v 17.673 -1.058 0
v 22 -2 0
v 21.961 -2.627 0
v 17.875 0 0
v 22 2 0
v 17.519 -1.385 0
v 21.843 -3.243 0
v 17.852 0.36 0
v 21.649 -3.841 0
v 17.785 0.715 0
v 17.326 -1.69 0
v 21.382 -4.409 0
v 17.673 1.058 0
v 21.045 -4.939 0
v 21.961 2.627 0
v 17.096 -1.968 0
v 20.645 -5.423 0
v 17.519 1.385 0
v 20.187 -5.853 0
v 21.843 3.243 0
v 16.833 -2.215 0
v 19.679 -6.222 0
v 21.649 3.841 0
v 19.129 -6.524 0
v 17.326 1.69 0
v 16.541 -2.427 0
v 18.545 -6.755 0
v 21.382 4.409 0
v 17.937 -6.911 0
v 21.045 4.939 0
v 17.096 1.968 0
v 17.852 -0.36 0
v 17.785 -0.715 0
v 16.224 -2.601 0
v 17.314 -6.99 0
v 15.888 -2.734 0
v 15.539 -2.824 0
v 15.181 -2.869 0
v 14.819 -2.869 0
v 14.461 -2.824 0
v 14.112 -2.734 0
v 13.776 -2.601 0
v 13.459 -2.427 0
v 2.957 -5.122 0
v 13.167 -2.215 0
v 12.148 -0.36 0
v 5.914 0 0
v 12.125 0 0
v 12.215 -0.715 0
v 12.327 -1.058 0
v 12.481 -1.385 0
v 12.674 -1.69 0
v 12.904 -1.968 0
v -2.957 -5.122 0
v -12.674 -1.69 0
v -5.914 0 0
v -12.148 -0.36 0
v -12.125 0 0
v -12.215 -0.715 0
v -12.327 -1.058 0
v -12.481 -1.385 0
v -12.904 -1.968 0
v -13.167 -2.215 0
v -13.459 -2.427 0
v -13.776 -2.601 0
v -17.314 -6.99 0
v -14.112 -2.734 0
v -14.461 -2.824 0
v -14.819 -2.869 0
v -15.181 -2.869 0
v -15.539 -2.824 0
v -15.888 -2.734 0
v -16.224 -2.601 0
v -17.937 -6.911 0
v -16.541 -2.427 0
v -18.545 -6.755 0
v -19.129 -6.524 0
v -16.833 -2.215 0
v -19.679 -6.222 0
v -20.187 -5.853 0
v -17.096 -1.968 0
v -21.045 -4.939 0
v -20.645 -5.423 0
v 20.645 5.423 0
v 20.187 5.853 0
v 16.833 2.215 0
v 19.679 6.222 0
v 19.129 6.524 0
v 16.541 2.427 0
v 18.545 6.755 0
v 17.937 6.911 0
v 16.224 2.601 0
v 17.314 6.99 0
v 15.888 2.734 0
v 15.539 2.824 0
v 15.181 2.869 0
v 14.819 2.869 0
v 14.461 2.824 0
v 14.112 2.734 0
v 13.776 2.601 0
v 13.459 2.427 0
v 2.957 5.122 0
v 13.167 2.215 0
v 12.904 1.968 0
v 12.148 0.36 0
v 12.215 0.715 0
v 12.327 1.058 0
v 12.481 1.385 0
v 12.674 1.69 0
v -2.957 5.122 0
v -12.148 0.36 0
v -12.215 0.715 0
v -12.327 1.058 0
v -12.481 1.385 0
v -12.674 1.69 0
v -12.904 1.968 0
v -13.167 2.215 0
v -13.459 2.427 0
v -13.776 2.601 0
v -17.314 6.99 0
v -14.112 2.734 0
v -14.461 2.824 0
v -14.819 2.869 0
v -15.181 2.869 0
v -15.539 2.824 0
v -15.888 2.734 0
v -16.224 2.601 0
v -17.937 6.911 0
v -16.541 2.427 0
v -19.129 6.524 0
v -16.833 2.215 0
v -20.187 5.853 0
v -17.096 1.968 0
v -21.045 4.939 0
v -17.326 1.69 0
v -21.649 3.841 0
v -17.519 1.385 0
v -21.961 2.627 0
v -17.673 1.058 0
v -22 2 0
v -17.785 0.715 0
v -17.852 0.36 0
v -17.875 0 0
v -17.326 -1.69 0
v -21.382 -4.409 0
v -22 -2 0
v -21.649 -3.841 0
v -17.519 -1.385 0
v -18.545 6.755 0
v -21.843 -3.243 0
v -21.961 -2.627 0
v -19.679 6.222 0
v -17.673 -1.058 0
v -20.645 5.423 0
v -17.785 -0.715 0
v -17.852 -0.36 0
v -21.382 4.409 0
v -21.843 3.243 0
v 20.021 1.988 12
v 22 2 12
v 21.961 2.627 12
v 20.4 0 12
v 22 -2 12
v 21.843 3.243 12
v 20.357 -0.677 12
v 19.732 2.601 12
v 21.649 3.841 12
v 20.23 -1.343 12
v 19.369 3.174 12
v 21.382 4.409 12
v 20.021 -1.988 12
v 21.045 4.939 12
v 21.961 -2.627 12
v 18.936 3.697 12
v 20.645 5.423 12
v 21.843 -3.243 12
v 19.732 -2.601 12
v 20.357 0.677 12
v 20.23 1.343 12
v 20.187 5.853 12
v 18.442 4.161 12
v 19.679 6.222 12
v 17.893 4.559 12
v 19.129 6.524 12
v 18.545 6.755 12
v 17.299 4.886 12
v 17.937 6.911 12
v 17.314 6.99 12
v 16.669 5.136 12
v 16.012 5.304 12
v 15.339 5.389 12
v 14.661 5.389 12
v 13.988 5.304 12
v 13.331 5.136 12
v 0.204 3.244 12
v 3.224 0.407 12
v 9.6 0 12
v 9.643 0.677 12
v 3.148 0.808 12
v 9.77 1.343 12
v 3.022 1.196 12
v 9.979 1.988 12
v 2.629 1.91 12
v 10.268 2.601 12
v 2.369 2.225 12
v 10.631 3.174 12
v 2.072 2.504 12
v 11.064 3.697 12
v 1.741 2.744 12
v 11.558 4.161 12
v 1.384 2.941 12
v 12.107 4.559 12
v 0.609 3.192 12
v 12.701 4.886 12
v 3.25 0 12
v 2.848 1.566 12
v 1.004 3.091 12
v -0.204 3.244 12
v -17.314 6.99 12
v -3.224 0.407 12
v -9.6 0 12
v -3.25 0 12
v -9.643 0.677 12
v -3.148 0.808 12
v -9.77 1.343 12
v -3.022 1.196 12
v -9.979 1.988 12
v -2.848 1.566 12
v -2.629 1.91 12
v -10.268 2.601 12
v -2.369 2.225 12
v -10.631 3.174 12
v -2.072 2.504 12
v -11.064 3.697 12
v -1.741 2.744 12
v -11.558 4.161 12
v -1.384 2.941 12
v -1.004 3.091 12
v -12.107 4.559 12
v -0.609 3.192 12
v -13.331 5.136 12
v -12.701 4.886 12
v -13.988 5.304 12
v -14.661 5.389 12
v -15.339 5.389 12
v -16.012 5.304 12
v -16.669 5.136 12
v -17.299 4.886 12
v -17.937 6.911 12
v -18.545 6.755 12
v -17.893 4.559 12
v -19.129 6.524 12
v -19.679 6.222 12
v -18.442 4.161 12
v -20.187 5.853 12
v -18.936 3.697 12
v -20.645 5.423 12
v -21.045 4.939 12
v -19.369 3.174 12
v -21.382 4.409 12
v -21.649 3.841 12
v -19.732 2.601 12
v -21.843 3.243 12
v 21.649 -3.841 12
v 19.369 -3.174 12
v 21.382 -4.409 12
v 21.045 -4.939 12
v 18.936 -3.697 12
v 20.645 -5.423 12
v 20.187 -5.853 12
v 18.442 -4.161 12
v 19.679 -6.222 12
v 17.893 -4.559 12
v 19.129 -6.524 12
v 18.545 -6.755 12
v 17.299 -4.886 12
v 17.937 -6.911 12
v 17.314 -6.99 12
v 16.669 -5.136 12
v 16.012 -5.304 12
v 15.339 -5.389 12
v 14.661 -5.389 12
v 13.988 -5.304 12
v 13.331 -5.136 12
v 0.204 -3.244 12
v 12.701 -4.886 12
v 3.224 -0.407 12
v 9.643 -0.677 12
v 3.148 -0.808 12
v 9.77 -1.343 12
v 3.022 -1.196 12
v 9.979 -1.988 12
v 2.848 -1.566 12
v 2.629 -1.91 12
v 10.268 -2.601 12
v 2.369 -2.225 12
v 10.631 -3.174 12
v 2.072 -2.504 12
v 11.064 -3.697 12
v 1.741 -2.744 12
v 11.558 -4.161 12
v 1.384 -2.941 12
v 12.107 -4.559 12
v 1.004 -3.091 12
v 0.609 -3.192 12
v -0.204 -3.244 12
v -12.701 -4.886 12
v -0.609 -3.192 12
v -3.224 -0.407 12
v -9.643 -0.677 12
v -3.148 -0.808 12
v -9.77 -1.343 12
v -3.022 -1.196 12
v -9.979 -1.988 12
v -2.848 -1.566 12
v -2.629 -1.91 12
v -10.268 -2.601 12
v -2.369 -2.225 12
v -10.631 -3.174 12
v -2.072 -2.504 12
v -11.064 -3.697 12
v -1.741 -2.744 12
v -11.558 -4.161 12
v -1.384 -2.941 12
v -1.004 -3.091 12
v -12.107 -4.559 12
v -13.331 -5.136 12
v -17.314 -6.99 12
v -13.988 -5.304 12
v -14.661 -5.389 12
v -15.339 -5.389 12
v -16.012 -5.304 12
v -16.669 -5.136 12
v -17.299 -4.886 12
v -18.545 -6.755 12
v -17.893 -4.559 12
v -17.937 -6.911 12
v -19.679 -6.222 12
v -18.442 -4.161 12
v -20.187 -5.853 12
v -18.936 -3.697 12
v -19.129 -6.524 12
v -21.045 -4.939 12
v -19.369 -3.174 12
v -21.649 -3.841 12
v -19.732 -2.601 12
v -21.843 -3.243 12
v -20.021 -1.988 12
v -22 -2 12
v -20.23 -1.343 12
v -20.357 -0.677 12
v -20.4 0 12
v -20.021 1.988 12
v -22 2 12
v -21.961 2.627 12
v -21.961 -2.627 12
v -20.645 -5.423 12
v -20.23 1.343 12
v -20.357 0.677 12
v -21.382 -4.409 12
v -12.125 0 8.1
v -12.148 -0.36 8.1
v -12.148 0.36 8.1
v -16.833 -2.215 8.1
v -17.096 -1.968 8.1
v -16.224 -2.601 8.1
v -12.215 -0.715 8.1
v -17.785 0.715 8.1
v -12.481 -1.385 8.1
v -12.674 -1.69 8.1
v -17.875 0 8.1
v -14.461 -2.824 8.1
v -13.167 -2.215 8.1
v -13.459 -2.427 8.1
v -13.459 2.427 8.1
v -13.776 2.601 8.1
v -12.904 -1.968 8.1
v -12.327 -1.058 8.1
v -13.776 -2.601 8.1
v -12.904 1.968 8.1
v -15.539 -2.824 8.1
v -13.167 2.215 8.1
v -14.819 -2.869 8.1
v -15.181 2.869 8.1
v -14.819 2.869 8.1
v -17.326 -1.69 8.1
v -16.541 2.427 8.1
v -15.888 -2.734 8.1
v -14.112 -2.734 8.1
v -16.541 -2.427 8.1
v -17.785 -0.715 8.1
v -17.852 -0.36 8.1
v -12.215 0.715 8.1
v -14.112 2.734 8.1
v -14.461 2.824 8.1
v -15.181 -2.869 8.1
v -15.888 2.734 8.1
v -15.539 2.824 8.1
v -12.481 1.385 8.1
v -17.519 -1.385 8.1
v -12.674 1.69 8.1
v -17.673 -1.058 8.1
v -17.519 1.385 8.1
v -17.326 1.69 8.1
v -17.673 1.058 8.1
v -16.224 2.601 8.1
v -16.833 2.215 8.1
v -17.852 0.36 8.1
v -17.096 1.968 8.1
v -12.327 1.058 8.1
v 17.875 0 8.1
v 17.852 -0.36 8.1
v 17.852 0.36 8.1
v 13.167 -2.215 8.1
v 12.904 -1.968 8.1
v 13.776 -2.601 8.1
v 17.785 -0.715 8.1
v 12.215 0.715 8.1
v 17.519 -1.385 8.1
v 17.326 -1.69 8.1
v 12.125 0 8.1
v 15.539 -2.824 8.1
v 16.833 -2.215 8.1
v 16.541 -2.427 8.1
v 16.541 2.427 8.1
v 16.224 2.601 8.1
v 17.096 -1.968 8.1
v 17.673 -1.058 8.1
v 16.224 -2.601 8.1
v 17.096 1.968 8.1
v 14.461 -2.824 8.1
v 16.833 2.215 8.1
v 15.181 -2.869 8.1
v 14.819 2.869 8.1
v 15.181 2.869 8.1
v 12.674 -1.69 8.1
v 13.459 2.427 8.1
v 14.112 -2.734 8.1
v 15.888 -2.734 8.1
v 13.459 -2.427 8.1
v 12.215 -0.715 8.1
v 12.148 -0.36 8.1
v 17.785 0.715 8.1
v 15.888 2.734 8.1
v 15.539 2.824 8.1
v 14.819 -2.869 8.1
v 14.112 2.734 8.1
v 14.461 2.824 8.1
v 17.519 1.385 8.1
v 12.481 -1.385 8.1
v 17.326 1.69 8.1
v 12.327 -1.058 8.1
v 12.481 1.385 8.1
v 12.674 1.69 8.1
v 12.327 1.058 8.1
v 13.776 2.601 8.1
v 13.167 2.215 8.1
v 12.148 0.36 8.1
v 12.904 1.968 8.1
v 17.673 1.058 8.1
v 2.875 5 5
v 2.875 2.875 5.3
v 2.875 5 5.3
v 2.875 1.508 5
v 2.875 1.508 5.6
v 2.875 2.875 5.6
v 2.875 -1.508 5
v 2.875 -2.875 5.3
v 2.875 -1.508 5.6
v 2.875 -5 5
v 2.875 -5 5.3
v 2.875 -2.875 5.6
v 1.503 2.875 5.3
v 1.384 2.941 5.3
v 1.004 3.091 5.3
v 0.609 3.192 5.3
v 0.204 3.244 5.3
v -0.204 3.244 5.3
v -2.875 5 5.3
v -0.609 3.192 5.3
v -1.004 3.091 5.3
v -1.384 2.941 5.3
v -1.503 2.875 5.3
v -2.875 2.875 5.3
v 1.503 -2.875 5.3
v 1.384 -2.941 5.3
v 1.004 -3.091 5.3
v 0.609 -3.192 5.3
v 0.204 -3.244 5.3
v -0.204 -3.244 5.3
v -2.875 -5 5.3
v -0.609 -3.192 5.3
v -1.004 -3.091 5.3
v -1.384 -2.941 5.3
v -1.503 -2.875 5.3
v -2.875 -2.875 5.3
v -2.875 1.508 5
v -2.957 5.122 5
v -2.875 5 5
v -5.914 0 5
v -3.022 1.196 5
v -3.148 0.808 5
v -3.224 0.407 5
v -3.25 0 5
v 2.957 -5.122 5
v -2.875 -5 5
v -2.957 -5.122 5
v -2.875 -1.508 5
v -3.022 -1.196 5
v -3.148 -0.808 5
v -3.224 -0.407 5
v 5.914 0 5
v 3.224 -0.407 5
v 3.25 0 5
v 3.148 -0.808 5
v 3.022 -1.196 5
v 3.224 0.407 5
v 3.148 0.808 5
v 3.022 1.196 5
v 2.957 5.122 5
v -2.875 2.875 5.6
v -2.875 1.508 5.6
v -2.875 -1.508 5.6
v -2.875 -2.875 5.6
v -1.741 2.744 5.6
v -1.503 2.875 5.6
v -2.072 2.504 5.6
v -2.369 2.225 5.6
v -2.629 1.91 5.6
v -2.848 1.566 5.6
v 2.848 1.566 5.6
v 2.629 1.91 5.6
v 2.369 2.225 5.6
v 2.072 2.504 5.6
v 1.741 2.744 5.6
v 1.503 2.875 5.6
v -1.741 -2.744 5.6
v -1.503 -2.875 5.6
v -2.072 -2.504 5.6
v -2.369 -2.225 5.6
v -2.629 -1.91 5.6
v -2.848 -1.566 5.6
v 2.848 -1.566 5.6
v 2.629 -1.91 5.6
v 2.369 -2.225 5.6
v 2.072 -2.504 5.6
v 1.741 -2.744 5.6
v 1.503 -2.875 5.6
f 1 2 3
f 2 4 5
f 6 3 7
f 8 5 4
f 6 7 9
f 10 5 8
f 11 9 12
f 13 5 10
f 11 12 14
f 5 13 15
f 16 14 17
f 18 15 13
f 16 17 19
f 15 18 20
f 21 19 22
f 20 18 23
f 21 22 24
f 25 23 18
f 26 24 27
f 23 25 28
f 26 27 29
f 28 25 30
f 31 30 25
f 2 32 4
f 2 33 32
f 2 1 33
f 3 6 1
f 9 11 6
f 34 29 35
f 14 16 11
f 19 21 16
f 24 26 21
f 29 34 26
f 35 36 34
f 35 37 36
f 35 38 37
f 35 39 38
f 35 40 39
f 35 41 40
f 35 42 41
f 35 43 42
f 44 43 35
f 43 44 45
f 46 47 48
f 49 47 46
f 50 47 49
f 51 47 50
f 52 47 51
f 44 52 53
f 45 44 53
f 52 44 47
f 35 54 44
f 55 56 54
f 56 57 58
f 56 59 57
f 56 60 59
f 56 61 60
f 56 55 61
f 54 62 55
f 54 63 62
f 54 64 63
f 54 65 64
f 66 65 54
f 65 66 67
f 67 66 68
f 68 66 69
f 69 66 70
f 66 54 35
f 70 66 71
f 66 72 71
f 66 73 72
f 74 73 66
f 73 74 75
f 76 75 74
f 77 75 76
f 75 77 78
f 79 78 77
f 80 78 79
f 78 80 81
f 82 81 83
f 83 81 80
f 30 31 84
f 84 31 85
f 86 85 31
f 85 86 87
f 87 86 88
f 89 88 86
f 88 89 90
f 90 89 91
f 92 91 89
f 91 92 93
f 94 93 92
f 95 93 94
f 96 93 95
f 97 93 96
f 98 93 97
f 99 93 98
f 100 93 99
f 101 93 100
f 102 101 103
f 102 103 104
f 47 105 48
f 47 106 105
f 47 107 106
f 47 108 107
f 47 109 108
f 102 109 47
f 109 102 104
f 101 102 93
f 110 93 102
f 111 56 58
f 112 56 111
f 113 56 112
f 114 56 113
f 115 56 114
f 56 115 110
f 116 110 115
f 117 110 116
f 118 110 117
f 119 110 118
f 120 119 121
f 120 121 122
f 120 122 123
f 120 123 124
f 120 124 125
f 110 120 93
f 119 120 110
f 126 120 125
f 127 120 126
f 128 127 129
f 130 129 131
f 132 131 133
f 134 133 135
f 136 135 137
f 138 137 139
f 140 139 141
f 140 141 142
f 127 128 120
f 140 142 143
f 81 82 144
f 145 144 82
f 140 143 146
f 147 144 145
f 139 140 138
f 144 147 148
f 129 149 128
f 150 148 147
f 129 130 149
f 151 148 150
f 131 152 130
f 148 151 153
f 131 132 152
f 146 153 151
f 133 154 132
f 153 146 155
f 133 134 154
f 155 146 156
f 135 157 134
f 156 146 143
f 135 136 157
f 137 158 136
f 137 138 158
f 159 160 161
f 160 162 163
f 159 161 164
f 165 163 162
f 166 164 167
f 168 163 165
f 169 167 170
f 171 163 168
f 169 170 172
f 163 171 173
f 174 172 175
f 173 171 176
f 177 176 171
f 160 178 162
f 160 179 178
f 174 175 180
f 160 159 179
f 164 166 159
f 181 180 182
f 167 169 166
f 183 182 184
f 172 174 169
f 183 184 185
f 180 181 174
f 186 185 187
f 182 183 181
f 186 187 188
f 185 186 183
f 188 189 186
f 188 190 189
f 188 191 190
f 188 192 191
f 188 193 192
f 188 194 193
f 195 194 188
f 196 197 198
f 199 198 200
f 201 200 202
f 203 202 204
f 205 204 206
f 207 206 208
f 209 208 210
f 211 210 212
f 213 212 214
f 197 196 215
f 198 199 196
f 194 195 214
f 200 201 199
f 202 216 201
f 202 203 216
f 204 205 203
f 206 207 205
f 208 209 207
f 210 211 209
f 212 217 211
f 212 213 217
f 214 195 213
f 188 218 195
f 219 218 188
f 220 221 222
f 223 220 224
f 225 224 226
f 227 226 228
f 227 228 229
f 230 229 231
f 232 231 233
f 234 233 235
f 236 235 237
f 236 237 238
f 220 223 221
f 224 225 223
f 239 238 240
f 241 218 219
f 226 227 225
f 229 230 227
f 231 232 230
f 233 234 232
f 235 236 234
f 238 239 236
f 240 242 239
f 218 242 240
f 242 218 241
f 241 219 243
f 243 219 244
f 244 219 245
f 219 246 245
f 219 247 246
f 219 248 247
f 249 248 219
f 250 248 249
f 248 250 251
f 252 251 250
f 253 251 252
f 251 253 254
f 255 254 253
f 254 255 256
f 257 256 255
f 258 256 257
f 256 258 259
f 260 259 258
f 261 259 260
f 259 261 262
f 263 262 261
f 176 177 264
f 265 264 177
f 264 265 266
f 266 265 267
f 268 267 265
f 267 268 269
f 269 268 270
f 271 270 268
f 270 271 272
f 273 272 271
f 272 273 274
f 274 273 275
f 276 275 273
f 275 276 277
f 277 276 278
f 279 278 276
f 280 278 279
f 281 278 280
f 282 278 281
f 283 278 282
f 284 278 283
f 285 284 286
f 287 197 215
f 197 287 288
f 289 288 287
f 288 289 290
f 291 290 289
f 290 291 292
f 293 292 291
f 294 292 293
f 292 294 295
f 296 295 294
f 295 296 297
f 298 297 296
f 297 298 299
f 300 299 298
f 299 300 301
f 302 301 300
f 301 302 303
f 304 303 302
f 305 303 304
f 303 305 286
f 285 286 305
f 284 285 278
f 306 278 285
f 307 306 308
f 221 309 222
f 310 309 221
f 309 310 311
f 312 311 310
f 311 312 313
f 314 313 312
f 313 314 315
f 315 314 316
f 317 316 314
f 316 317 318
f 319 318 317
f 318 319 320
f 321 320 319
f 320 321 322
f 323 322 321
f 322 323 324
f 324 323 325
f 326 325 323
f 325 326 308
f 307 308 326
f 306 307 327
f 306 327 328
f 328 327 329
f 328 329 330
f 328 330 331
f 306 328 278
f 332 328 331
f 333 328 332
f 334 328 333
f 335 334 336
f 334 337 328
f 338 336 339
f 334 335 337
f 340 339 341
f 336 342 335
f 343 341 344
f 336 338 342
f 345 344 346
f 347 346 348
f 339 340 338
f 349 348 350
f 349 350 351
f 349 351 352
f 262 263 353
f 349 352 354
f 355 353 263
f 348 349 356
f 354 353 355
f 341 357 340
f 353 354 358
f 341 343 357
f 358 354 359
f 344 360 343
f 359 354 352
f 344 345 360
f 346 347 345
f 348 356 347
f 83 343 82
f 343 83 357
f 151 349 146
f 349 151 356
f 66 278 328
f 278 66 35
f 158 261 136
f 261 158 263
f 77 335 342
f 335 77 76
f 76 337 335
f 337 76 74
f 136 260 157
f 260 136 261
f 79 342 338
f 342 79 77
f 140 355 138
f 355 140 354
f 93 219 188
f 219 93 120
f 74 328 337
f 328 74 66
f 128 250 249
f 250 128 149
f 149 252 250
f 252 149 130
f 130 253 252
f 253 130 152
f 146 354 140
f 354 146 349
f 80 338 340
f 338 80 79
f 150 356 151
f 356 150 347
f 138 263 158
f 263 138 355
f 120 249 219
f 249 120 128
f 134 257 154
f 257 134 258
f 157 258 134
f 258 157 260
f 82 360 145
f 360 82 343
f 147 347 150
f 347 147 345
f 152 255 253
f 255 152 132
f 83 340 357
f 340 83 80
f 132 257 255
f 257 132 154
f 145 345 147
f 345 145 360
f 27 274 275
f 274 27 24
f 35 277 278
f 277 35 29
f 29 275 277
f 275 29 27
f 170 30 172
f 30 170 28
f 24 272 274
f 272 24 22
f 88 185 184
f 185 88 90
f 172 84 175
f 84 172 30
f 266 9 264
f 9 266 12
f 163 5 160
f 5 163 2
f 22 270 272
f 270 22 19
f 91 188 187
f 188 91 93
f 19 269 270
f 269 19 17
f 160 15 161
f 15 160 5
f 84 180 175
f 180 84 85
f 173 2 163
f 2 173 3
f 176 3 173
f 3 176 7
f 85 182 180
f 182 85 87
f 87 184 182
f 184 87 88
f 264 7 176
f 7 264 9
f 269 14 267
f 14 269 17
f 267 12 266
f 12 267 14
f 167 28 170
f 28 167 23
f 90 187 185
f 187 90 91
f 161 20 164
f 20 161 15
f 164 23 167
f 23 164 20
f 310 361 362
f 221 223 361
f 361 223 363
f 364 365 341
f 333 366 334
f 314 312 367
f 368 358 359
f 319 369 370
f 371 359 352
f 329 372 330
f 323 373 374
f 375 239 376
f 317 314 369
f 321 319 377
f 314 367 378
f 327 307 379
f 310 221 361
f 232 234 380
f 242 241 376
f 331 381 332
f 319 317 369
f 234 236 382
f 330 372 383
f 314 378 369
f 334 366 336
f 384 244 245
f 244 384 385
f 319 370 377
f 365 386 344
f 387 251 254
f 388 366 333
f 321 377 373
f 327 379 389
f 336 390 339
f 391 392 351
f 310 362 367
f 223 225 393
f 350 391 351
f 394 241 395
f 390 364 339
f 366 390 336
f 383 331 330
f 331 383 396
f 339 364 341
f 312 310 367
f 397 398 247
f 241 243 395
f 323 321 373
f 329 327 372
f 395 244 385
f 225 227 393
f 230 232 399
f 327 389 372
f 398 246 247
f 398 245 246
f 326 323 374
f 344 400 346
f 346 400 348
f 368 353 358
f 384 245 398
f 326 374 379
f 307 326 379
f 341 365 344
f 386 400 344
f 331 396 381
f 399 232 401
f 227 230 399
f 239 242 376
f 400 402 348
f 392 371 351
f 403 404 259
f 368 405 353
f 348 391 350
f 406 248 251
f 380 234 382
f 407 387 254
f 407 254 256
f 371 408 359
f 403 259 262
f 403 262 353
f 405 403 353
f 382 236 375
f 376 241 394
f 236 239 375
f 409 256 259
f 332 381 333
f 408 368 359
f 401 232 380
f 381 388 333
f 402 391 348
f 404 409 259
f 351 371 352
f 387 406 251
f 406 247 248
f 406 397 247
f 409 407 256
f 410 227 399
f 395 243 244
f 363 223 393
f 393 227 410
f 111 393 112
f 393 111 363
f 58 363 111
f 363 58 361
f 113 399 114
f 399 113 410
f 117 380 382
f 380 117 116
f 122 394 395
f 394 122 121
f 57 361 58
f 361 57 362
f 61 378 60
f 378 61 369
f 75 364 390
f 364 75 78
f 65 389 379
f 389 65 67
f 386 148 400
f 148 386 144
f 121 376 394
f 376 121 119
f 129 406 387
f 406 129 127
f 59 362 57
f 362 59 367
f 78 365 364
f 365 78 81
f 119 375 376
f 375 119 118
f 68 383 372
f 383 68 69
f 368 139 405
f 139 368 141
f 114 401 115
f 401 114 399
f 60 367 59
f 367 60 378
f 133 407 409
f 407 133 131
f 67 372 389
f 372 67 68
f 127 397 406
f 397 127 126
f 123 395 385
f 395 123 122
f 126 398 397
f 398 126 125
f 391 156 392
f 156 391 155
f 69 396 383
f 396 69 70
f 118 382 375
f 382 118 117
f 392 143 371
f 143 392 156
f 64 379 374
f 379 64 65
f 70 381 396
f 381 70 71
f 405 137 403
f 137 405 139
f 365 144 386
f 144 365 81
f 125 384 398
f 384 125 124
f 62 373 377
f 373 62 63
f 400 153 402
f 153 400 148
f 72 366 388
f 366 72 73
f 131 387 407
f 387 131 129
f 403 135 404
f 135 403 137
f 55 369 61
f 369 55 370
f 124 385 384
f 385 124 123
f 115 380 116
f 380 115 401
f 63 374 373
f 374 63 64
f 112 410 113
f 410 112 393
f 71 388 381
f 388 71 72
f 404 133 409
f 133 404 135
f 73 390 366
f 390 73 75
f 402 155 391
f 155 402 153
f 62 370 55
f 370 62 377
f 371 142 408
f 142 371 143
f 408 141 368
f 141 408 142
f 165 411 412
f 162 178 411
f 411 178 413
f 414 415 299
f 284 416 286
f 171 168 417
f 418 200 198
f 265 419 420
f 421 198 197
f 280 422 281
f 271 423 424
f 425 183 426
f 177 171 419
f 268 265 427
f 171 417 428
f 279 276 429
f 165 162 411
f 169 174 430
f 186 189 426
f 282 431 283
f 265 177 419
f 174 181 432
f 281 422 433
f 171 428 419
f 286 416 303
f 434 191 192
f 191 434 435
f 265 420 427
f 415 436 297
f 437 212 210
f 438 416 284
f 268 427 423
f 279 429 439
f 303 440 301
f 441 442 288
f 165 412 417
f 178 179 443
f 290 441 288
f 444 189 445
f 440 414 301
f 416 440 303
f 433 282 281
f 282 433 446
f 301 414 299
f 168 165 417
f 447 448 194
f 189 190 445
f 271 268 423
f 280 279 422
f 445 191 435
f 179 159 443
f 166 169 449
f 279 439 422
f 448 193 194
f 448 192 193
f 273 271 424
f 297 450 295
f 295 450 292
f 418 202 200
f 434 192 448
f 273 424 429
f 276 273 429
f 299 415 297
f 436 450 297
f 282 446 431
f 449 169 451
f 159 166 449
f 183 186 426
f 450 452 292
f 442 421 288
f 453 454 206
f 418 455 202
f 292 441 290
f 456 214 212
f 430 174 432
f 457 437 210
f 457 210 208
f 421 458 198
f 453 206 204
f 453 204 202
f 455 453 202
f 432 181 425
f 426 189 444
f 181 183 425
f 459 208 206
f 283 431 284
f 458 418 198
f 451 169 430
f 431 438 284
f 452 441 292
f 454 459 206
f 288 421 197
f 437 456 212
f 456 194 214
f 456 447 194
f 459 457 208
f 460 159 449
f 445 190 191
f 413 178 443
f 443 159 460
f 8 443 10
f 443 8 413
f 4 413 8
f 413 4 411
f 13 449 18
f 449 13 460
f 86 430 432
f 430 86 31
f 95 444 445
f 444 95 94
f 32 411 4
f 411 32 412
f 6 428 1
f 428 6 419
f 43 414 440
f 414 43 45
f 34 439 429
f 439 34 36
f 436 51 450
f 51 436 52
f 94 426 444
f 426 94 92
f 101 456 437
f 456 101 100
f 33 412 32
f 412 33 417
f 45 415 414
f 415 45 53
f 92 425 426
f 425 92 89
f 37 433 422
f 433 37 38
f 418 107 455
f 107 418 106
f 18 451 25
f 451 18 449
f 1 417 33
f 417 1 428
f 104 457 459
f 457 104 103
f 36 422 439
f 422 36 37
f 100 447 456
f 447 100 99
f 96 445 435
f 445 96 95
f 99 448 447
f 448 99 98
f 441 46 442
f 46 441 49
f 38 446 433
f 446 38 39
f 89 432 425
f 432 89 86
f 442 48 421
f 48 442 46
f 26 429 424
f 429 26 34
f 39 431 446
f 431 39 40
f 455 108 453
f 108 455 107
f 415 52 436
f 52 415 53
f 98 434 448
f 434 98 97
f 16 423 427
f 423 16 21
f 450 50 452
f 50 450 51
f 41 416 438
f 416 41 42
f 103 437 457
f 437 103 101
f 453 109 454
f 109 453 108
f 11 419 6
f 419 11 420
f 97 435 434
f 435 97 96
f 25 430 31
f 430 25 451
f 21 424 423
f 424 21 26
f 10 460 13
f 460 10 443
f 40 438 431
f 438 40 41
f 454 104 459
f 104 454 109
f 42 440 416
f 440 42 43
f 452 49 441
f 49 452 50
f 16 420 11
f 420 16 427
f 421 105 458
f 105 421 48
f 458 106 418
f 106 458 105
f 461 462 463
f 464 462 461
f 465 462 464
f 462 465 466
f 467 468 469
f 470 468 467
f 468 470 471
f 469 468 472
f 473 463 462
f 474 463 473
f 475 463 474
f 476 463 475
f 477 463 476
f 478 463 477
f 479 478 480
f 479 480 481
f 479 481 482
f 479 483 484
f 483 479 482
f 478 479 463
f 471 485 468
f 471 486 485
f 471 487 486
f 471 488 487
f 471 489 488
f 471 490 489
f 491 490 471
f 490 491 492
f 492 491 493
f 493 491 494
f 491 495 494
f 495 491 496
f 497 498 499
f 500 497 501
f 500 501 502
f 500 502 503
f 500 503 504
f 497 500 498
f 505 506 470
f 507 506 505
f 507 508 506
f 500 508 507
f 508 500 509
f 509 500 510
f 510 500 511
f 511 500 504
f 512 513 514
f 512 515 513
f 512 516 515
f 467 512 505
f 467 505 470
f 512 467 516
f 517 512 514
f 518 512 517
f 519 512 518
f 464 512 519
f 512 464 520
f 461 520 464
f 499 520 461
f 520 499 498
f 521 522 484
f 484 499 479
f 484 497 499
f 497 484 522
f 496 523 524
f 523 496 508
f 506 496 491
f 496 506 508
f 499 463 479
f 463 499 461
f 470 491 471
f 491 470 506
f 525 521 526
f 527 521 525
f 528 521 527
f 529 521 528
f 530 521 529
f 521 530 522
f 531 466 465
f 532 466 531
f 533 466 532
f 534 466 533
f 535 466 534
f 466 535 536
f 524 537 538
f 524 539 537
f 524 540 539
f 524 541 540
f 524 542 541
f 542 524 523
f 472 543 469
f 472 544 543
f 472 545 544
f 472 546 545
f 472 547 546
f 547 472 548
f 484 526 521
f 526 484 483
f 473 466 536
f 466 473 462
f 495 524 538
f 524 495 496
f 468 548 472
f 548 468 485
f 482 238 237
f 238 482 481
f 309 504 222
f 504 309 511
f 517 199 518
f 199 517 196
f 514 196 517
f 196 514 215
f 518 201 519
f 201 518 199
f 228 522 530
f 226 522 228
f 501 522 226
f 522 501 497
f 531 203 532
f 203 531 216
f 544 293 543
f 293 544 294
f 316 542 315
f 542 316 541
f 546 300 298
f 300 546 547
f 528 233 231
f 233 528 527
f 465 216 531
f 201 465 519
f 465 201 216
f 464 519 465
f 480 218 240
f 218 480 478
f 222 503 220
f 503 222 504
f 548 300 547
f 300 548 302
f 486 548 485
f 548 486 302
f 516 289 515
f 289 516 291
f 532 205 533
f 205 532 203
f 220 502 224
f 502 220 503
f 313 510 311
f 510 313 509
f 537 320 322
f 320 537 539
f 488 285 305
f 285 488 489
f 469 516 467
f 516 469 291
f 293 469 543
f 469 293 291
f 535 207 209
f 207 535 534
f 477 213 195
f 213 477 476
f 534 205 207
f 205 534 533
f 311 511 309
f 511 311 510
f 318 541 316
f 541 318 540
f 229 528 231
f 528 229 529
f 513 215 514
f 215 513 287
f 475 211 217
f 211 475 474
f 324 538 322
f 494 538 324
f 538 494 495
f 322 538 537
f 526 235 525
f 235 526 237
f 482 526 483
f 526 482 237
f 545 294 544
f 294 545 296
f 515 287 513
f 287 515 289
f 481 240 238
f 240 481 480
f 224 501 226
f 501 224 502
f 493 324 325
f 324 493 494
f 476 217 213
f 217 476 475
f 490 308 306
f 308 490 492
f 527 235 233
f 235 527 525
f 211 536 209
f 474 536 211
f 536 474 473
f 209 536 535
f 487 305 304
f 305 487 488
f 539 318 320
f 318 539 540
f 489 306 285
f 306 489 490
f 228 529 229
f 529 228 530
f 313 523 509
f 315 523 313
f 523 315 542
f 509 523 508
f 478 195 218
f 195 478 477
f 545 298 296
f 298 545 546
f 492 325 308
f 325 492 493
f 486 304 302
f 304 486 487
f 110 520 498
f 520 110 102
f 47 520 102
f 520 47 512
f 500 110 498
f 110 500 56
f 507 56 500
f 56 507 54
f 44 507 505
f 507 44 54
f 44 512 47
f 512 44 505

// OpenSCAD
$fn = 50;


difference() {
	union() {
		cylinder(h = 12, r = 7.0000000000);
		translate(v = [-7.5000000000, 0.0000000000, 0]) {
			hull() {
				translate(v = [-9.5000000000, 2.0000000000, 0]) {
					cylinder(h = 12, r = 5);
				}
				translate(v = [9.5000000000, 2.0000000000, 0]) {
					cylinder(h = 12, r = 5);
				}
				translate(v = [-9.5000000000, -2.0000000000, 0]) {
					cylinder(h = 12, r = 5);
				}
				translate(v = [9.5000000000, -2.0000000000, 0]) {
					cylinder(h = 12, r = 5);
				}
			}
		}
		translate(v = [-7.5000000000, 0.0000000000, 0]) {
			hull() {
				translate(v = [-9.5000000000, 2.0000000000, 0]) {
					cylinder(h = 12, r = 5);
				}
				translate(v = [9.5000000000, 2.0000000000, 0]) {
					cylinder(h = 12, r = 5);
				}
				translate(v = [-9.5000000000, -2.0000000000, 0]) {
					cylinder(h = 12, r = 5);
				}
				translate(v = [9.5000000000, -2.0000000000, 0]) {
					cylinder(h = 12, r = 5);
				}
			}
		}
		translate(v = [7.5000000000, 0.0000000000, 0]) {
			hull() {
				translate(v = [-9.5000000000, 2.0000000000, 0]) {
					cylinder(h = 12, r = 5);
				}
				translate(v = [9.5000000000, 2.0000000000, 0]) {
					cylinder(h = 12, r = 5);
				}
				translate(v = [-9.5000000000, -2.0000000000, 0]) {
					cylinder(h = 12, r = 5);
				}
				translate(v = [9.5000000000, -2.0000000000, 0]) {
					cylinder(h = 12, r = 5);
				}
			}
		}
		translate(v = [7.5000000000, 0.0000000000, 0]) {
			hull() {
				translate(v = [-9.5000000000, 2.0000000000, 0]) {
					cylinder(h = 12, r = 5);
				}
				translate(v = [9.5000000000, 2.0000000000, 0]) {
					cylinder(h = 12, r = 5);
				}
				translate(v = [-9.5000000000, -2.0000000000, 0]) {
					cylinder(h = 12, r = 5);
				}
				translate(v = [9.5000000000, -2.0000000000, 0]) {
					cylinder(h = 12, r = 5);
				}
			}
		}
	}
	union() {
		translate(v = [-15.0000000000, 0.0000000000, 12]) {
			rotate(a = [0, 0, 0]) {
				difference() {
					union() {
						#translate(v = [0, 0, -12.0000000000]) {
							cylinder(h = 12, r = 2.6000000000);
						}
						#translate(v = [0, 0, -3.9000000000]) {
							cylinder(h = 3.9000000000, r1 = 2.8750000000, r2 = 5.4000000000);
						}
						#translate(v = [0, 0, -12.0000000000]) {
							cylinder(h = 12, r = 2.8750000000);
						}
						#translate(v = [0, 0, -12.0000000000]) {
							cylinder(h = 12, r = 2.6000000000);
						}
					}
					union();
				}
			}
		}
		translate(v = [-15.0000000000, 0.0000000000, 12]) {
			rotate(a = [0, 0, 0]) {
				difference() {
					union() {
						#translate(v = [0, 0, -12.0000000000]) {
							cylinder(h = 12, r = 2.6000000000);
						}
						#translate(v = [0, 0, -3.9000000000]) {
							cylinder(h = 3.9000000000, r1 = 2.8750000000, r2 = 5.4000000000);
						}
						#translate(v = [0, 0, -12.0000000000]) {
							cylinder(h = 12, r = 2.8750000000);
						}
						#translate(v = [0, 0, -12.0000000000]) {
							cylinder(h = 12, r = 2.6000000000);
						}
					}
					union();
				}
			}
		}
		translate(v = [15.0000000000, 0.0000000000, 12]) {
			rotate(a = [0, 0, 0]) {
				difference() {
					union() {
						#translate(v = [0, 0, -12.0000000000]) {
							cylinder(h = 12, r = 2.6000000000);
						}
						#translate(v = [0, 0, -3.9000000000]) {
							cylinder(h = 3.9000000000, r1 = 2.8750000000, r2 = 5.4000000000);
						}
						#translate(v = [0, 0, -12.0000000000]) {
							cylinder(h = 12, r = 2.8750000000);
						}
						#translate(v = [0, 0, -12.0000000000]) {
							cylinder(h = 12, r = 2.6000000000);
						}
					}
					union();
				}
			}
		}
		translate(v = [15.0000000000, 0.0000000000, 12]) {
			rotate(a = [0, 0, 0]) {
				difference() {
					union() {
						#translate(v = [0, 0, -12.0000000000]) {
							cylinder(h = 12, r = 2.6000000000);
						}
						#translate(v = [0, 0, -3.9000000000]) {
							cylinder(h = 3.9000000000, r1 = 2.8750000000, r2 = 5.4000000000);
						}
						#translate(v = [0, 0, -12.0000000000]) {
							cylinder(h = 12, r = 2.8750000000);
						}
						#translate(v = [0, 0, -12.0000000000]) {
							cylinder(h = 12, r = 2.6000000000);
						}
					}
					union();
				}
			}
		}
		translate(v = [0.0000000000, 0.0000000000, 0]) {
			rotate(a = [0, 0, 0]) {
				difference() {
					union() {
						#translate(v = [-2.8750000000, -5.0000000000, -0.3000000000]) {
							cube(size = [5.7500000000, 10, 0.3000000000]);
						}
						#translate(v = [-2.8750000000, -2.8750000000, -0.6000000000]) {
							cube(size = [5.7500000000, 5.7500000000, 0.3000000000]);
						}
						#translate(v = [-2.8750000000, -5.0000000000, 5]) {
							cube(size = [5.7500000000, 10, 0.3000000000]);
						}
						#translate(v = [-2.8750000000, -2.8750000000, 5.3000000000]) {
							cube(size = [5.7500000000, 5.7500000000, 0.3000000000]);
						}
						#translate(v = [0, 0, -100.0000000000]) {
							cylinder(h = 200, r = 3.2500000000);
						}
						#linear_extrude(height = 5) {
							polygon(points = [[5.9142500000, 0.0000000000], [2.9571250000, 5.1218907443], [-2.9571250000, 5.1218907443], [-5.9142500000, 0.0000000000], [-2.9571250000, -5.1218907443], [2.9571250000, -5.1218907443]]);
						}
						#translate(v = [-2.8750000000, -5.0000000000, -0.3000000000]) {
							cube(size = [5.7500000000, 10, 0.3000000000]);
						}
						#translate(v = [-2.8750000000, -2.8750000000, -0.6000000000]) {
							cube(size = [5.7500000000, 5.7500000000, 0.3000000000]);
						}
						#translate(v = [-2.8750000000, -5.0000000000, 5]) {
							cube(size = [5.7500000000, 10, 0.3000000000]);
						}
						#translate(v = [-2.8750000000, -2.8750000000, 5.3000000000]) {
							cube(size = [5.7500000000, 5.7500000000, 0.3000000000]);
						}
						#translate(v = [0, 0, -100.0000000000]) {
							cylinder(h = 200, r = 3.2500000000);
						}
						#translate(v = [-2.8750000000, -5.0000000000, -0.3000000000]) {
							cube(size = [5.7500000000, 10, 0.3000000000]);
						}
						#translate(v = [-2.8750000000, -2.8750000000, -0.6000000000]) {
							cube(size = [5.7500000000, 5.7500000000, 0.3000000000]);
						}
						#translate(v = [-2.8750000000, -5.0000000000, 5]) {
							cube(size = [5.7500000000, 10, 0.3000000000]);
						}
						#translate(v = [-2.8750000000, -2.8750000000, 5.3000000000]) {
							cube(size = [5.7500000000, 5.7500000000, 0.3000000000]);
						}
						#translate(v = [0, 0, -100.0000000000]) {
							cylinder(h = 200, r = 3.2500000000);
						}
					}
					union();
				}
			}
		}
		translate(v = [0, 0, -100]) {
			cylinder(h = 200, r = 3.2500000000);
		}
		translate(v = [0, 0, -100]) {
			cylinder(h = 200, r = 1.8000000000);
		}
	}
}
